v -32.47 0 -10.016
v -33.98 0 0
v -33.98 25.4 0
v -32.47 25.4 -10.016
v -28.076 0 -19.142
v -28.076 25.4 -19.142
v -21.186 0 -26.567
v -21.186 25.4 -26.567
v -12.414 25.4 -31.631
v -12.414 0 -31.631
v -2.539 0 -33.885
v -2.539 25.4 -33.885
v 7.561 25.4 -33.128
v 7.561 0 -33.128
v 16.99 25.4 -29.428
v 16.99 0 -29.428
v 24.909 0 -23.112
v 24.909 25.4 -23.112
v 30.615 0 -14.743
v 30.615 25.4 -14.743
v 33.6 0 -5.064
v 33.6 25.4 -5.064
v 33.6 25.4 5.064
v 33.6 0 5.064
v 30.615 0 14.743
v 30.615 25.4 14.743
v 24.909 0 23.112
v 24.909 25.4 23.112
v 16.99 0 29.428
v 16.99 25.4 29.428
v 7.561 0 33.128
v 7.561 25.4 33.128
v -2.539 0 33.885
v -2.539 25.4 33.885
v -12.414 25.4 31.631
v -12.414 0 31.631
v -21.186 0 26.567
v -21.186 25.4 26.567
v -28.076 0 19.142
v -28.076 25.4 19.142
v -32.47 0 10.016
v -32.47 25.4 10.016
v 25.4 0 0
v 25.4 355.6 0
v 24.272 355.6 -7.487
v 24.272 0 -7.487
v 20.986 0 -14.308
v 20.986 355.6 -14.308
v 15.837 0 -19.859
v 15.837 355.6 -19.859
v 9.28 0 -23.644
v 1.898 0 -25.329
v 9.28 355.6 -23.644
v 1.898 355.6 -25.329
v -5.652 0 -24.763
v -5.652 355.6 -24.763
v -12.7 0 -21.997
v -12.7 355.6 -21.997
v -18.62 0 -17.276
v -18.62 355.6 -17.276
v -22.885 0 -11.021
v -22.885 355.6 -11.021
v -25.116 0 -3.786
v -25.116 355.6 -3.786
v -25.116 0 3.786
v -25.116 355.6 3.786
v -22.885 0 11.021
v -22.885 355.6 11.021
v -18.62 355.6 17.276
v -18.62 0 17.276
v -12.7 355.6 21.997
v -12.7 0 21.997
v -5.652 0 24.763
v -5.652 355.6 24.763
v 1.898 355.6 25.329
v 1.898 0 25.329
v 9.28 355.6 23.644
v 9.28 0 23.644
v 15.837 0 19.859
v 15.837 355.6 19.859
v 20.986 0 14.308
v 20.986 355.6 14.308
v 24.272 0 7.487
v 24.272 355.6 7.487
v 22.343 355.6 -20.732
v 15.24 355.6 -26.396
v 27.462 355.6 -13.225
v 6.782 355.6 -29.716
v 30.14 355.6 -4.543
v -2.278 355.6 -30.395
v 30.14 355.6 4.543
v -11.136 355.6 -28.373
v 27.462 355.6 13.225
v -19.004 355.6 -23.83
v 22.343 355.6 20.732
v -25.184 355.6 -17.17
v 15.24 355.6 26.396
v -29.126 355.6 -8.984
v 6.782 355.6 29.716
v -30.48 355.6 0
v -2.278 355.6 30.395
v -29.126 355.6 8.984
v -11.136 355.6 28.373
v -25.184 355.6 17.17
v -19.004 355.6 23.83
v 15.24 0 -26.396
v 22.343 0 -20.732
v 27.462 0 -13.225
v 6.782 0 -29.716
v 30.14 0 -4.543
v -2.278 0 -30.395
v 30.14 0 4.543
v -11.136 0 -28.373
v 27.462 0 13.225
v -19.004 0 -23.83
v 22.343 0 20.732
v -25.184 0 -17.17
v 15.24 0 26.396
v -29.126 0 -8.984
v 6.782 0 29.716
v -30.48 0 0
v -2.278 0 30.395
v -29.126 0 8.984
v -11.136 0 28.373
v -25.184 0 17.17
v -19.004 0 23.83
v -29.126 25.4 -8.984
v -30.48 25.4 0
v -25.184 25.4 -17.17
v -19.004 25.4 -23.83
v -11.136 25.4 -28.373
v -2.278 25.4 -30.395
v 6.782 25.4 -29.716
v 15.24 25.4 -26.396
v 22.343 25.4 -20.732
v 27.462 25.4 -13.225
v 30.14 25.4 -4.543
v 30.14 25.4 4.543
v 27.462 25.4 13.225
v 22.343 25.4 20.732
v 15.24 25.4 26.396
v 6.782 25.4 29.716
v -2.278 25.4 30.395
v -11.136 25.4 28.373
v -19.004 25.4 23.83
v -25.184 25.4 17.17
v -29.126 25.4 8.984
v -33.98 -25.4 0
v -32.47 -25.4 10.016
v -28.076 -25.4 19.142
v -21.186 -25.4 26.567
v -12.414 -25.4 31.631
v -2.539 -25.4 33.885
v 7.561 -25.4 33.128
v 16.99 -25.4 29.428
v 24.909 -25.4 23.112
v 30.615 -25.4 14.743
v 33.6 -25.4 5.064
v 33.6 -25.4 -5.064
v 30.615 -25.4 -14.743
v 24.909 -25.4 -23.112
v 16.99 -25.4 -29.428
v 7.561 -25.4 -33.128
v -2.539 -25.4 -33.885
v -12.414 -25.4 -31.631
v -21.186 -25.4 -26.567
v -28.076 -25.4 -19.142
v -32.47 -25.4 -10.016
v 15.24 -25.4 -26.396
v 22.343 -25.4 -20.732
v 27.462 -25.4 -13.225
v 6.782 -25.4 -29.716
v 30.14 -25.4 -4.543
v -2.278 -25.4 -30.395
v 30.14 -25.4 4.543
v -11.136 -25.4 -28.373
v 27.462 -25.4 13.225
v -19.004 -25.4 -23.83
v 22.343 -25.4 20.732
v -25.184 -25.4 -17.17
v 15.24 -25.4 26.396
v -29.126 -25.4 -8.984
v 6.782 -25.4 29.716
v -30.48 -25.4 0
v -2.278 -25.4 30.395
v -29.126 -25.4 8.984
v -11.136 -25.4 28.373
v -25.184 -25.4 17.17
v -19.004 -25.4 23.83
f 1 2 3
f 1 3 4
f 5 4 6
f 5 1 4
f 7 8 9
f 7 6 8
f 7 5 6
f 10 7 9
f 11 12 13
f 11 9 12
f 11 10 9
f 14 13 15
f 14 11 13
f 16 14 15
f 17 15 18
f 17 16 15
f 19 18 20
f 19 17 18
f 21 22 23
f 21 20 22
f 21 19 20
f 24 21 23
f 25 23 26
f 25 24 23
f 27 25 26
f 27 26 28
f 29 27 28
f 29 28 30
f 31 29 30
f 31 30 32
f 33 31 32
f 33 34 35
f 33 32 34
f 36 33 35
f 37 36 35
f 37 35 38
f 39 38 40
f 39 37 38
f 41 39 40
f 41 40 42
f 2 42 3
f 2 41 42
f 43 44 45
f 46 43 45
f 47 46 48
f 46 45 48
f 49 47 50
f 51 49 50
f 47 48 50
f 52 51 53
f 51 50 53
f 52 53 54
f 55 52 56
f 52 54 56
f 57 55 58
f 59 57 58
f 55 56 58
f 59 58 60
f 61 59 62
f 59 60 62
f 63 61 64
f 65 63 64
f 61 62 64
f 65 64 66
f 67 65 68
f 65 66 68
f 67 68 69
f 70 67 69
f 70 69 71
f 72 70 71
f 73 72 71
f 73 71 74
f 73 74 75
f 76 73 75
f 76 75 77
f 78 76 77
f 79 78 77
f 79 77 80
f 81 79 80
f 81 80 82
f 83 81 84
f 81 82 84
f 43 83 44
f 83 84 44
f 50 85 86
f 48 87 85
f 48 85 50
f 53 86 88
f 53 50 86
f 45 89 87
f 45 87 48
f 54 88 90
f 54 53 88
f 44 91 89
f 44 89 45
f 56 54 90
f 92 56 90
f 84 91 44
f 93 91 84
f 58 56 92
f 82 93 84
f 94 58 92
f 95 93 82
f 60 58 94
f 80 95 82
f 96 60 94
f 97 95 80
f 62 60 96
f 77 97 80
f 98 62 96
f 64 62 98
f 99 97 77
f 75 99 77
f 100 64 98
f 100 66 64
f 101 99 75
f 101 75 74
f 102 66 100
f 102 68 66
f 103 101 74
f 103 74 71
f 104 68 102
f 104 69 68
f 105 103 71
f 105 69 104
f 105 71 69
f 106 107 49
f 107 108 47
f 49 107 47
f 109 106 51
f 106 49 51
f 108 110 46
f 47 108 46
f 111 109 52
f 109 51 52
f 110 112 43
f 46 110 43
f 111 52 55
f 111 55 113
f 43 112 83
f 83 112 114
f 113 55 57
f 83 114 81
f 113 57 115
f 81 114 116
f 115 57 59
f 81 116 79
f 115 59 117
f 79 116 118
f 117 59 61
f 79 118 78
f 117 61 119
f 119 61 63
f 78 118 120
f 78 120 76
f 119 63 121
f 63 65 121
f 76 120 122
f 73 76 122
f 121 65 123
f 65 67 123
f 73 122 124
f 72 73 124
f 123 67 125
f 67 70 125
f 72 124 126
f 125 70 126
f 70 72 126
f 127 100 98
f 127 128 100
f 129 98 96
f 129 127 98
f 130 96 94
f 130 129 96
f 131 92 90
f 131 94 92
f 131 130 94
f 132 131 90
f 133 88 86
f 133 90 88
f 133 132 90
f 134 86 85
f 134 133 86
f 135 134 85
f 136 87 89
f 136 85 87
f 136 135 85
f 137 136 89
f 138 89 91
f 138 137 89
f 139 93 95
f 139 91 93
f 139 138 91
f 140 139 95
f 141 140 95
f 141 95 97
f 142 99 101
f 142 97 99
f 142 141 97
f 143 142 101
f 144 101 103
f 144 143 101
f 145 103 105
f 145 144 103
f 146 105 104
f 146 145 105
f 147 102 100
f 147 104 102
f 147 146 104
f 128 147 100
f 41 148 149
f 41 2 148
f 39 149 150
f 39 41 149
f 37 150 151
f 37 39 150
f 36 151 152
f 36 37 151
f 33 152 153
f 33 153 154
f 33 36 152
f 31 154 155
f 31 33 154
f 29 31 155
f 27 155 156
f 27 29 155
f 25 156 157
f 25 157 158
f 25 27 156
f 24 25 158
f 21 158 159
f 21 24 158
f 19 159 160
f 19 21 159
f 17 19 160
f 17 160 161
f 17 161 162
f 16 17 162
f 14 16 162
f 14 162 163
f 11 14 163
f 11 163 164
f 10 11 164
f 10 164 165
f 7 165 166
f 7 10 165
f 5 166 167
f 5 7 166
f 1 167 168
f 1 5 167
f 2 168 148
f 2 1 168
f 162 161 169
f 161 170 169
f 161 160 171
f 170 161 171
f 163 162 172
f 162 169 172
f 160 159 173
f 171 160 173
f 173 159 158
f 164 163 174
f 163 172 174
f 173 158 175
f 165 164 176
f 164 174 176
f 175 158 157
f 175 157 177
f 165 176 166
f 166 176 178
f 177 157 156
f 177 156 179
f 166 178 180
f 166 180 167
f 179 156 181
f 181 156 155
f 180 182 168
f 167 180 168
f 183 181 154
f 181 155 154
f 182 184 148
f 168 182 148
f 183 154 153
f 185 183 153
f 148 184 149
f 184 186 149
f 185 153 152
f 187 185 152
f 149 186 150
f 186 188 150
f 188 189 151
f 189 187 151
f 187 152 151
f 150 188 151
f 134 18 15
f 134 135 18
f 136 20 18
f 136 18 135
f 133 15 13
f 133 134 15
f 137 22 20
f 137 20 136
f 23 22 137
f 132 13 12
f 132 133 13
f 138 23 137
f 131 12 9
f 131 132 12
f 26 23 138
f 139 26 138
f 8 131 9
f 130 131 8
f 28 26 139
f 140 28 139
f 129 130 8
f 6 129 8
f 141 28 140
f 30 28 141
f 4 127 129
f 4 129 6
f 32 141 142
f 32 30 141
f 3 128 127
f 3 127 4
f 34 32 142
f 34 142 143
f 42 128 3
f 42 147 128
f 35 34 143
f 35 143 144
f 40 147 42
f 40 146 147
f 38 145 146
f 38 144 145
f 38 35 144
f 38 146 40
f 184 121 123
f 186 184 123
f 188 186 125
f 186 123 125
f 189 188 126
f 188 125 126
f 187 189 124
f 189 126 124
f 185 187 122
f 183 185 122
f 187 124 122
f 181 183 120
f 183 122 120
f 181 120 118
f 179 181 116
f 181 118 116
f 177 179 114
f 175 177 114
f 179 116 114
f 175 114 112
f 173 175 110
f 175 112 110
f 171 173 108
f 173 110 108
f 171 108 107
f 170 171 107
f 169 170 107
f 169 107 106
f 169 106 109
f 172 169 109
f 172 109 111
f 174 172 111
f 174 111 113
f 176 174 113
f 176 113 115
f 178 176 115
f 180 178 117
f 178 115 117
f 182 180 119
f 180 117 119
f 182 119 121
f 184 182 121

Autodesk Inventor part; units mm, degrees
ref_plane "YZ Plane" through (0, 0, 0) normal (1, 0, 0) x (0, 1, 0)
ref_plane "XZ Plane" through (0, 0, 0) normal (0, 1, 0) x (-1, 0, 0)
ref_plane "XY Plane" through (0, 0, 0) normal (0, 0, 1) x (1, 0, 0)
sketch "Sketch1" plane through (0, 0, 0) normal (0, 1, 0) x (-1, 0, 0)
  circle A0 centre (0, 0) radius 30.48
  dimension "d0" = 60.96
extrude "Extrusion1" add sketch "Sketch1" along normal blind 355.6
sketch "Sketch2" plane through (0, 0, 0) normal (0, 1, 0) x (-1, 0, 0)
  circle A0 centre (0, 0) radius 33.98
  circle A1 centre (0, 0) radius 30.48 projected
  dimension "d3" = 3.5
extrude "Extrusion2" add sketch "Sketch2" along normal mid plane 50.8
sketch "Sketch3" plane through (0, 355.6, 0) normal (0, 1, 0) x (1, 0, 0)
  circle A0 centre (0, 0) radius 25.4
  dimension "d6" = 50.8
extrude "Extrusion3" cut sketch "Sketch3" against normal through all
properties part number "Water Sensor Shaft" material "PVC-Piping"
